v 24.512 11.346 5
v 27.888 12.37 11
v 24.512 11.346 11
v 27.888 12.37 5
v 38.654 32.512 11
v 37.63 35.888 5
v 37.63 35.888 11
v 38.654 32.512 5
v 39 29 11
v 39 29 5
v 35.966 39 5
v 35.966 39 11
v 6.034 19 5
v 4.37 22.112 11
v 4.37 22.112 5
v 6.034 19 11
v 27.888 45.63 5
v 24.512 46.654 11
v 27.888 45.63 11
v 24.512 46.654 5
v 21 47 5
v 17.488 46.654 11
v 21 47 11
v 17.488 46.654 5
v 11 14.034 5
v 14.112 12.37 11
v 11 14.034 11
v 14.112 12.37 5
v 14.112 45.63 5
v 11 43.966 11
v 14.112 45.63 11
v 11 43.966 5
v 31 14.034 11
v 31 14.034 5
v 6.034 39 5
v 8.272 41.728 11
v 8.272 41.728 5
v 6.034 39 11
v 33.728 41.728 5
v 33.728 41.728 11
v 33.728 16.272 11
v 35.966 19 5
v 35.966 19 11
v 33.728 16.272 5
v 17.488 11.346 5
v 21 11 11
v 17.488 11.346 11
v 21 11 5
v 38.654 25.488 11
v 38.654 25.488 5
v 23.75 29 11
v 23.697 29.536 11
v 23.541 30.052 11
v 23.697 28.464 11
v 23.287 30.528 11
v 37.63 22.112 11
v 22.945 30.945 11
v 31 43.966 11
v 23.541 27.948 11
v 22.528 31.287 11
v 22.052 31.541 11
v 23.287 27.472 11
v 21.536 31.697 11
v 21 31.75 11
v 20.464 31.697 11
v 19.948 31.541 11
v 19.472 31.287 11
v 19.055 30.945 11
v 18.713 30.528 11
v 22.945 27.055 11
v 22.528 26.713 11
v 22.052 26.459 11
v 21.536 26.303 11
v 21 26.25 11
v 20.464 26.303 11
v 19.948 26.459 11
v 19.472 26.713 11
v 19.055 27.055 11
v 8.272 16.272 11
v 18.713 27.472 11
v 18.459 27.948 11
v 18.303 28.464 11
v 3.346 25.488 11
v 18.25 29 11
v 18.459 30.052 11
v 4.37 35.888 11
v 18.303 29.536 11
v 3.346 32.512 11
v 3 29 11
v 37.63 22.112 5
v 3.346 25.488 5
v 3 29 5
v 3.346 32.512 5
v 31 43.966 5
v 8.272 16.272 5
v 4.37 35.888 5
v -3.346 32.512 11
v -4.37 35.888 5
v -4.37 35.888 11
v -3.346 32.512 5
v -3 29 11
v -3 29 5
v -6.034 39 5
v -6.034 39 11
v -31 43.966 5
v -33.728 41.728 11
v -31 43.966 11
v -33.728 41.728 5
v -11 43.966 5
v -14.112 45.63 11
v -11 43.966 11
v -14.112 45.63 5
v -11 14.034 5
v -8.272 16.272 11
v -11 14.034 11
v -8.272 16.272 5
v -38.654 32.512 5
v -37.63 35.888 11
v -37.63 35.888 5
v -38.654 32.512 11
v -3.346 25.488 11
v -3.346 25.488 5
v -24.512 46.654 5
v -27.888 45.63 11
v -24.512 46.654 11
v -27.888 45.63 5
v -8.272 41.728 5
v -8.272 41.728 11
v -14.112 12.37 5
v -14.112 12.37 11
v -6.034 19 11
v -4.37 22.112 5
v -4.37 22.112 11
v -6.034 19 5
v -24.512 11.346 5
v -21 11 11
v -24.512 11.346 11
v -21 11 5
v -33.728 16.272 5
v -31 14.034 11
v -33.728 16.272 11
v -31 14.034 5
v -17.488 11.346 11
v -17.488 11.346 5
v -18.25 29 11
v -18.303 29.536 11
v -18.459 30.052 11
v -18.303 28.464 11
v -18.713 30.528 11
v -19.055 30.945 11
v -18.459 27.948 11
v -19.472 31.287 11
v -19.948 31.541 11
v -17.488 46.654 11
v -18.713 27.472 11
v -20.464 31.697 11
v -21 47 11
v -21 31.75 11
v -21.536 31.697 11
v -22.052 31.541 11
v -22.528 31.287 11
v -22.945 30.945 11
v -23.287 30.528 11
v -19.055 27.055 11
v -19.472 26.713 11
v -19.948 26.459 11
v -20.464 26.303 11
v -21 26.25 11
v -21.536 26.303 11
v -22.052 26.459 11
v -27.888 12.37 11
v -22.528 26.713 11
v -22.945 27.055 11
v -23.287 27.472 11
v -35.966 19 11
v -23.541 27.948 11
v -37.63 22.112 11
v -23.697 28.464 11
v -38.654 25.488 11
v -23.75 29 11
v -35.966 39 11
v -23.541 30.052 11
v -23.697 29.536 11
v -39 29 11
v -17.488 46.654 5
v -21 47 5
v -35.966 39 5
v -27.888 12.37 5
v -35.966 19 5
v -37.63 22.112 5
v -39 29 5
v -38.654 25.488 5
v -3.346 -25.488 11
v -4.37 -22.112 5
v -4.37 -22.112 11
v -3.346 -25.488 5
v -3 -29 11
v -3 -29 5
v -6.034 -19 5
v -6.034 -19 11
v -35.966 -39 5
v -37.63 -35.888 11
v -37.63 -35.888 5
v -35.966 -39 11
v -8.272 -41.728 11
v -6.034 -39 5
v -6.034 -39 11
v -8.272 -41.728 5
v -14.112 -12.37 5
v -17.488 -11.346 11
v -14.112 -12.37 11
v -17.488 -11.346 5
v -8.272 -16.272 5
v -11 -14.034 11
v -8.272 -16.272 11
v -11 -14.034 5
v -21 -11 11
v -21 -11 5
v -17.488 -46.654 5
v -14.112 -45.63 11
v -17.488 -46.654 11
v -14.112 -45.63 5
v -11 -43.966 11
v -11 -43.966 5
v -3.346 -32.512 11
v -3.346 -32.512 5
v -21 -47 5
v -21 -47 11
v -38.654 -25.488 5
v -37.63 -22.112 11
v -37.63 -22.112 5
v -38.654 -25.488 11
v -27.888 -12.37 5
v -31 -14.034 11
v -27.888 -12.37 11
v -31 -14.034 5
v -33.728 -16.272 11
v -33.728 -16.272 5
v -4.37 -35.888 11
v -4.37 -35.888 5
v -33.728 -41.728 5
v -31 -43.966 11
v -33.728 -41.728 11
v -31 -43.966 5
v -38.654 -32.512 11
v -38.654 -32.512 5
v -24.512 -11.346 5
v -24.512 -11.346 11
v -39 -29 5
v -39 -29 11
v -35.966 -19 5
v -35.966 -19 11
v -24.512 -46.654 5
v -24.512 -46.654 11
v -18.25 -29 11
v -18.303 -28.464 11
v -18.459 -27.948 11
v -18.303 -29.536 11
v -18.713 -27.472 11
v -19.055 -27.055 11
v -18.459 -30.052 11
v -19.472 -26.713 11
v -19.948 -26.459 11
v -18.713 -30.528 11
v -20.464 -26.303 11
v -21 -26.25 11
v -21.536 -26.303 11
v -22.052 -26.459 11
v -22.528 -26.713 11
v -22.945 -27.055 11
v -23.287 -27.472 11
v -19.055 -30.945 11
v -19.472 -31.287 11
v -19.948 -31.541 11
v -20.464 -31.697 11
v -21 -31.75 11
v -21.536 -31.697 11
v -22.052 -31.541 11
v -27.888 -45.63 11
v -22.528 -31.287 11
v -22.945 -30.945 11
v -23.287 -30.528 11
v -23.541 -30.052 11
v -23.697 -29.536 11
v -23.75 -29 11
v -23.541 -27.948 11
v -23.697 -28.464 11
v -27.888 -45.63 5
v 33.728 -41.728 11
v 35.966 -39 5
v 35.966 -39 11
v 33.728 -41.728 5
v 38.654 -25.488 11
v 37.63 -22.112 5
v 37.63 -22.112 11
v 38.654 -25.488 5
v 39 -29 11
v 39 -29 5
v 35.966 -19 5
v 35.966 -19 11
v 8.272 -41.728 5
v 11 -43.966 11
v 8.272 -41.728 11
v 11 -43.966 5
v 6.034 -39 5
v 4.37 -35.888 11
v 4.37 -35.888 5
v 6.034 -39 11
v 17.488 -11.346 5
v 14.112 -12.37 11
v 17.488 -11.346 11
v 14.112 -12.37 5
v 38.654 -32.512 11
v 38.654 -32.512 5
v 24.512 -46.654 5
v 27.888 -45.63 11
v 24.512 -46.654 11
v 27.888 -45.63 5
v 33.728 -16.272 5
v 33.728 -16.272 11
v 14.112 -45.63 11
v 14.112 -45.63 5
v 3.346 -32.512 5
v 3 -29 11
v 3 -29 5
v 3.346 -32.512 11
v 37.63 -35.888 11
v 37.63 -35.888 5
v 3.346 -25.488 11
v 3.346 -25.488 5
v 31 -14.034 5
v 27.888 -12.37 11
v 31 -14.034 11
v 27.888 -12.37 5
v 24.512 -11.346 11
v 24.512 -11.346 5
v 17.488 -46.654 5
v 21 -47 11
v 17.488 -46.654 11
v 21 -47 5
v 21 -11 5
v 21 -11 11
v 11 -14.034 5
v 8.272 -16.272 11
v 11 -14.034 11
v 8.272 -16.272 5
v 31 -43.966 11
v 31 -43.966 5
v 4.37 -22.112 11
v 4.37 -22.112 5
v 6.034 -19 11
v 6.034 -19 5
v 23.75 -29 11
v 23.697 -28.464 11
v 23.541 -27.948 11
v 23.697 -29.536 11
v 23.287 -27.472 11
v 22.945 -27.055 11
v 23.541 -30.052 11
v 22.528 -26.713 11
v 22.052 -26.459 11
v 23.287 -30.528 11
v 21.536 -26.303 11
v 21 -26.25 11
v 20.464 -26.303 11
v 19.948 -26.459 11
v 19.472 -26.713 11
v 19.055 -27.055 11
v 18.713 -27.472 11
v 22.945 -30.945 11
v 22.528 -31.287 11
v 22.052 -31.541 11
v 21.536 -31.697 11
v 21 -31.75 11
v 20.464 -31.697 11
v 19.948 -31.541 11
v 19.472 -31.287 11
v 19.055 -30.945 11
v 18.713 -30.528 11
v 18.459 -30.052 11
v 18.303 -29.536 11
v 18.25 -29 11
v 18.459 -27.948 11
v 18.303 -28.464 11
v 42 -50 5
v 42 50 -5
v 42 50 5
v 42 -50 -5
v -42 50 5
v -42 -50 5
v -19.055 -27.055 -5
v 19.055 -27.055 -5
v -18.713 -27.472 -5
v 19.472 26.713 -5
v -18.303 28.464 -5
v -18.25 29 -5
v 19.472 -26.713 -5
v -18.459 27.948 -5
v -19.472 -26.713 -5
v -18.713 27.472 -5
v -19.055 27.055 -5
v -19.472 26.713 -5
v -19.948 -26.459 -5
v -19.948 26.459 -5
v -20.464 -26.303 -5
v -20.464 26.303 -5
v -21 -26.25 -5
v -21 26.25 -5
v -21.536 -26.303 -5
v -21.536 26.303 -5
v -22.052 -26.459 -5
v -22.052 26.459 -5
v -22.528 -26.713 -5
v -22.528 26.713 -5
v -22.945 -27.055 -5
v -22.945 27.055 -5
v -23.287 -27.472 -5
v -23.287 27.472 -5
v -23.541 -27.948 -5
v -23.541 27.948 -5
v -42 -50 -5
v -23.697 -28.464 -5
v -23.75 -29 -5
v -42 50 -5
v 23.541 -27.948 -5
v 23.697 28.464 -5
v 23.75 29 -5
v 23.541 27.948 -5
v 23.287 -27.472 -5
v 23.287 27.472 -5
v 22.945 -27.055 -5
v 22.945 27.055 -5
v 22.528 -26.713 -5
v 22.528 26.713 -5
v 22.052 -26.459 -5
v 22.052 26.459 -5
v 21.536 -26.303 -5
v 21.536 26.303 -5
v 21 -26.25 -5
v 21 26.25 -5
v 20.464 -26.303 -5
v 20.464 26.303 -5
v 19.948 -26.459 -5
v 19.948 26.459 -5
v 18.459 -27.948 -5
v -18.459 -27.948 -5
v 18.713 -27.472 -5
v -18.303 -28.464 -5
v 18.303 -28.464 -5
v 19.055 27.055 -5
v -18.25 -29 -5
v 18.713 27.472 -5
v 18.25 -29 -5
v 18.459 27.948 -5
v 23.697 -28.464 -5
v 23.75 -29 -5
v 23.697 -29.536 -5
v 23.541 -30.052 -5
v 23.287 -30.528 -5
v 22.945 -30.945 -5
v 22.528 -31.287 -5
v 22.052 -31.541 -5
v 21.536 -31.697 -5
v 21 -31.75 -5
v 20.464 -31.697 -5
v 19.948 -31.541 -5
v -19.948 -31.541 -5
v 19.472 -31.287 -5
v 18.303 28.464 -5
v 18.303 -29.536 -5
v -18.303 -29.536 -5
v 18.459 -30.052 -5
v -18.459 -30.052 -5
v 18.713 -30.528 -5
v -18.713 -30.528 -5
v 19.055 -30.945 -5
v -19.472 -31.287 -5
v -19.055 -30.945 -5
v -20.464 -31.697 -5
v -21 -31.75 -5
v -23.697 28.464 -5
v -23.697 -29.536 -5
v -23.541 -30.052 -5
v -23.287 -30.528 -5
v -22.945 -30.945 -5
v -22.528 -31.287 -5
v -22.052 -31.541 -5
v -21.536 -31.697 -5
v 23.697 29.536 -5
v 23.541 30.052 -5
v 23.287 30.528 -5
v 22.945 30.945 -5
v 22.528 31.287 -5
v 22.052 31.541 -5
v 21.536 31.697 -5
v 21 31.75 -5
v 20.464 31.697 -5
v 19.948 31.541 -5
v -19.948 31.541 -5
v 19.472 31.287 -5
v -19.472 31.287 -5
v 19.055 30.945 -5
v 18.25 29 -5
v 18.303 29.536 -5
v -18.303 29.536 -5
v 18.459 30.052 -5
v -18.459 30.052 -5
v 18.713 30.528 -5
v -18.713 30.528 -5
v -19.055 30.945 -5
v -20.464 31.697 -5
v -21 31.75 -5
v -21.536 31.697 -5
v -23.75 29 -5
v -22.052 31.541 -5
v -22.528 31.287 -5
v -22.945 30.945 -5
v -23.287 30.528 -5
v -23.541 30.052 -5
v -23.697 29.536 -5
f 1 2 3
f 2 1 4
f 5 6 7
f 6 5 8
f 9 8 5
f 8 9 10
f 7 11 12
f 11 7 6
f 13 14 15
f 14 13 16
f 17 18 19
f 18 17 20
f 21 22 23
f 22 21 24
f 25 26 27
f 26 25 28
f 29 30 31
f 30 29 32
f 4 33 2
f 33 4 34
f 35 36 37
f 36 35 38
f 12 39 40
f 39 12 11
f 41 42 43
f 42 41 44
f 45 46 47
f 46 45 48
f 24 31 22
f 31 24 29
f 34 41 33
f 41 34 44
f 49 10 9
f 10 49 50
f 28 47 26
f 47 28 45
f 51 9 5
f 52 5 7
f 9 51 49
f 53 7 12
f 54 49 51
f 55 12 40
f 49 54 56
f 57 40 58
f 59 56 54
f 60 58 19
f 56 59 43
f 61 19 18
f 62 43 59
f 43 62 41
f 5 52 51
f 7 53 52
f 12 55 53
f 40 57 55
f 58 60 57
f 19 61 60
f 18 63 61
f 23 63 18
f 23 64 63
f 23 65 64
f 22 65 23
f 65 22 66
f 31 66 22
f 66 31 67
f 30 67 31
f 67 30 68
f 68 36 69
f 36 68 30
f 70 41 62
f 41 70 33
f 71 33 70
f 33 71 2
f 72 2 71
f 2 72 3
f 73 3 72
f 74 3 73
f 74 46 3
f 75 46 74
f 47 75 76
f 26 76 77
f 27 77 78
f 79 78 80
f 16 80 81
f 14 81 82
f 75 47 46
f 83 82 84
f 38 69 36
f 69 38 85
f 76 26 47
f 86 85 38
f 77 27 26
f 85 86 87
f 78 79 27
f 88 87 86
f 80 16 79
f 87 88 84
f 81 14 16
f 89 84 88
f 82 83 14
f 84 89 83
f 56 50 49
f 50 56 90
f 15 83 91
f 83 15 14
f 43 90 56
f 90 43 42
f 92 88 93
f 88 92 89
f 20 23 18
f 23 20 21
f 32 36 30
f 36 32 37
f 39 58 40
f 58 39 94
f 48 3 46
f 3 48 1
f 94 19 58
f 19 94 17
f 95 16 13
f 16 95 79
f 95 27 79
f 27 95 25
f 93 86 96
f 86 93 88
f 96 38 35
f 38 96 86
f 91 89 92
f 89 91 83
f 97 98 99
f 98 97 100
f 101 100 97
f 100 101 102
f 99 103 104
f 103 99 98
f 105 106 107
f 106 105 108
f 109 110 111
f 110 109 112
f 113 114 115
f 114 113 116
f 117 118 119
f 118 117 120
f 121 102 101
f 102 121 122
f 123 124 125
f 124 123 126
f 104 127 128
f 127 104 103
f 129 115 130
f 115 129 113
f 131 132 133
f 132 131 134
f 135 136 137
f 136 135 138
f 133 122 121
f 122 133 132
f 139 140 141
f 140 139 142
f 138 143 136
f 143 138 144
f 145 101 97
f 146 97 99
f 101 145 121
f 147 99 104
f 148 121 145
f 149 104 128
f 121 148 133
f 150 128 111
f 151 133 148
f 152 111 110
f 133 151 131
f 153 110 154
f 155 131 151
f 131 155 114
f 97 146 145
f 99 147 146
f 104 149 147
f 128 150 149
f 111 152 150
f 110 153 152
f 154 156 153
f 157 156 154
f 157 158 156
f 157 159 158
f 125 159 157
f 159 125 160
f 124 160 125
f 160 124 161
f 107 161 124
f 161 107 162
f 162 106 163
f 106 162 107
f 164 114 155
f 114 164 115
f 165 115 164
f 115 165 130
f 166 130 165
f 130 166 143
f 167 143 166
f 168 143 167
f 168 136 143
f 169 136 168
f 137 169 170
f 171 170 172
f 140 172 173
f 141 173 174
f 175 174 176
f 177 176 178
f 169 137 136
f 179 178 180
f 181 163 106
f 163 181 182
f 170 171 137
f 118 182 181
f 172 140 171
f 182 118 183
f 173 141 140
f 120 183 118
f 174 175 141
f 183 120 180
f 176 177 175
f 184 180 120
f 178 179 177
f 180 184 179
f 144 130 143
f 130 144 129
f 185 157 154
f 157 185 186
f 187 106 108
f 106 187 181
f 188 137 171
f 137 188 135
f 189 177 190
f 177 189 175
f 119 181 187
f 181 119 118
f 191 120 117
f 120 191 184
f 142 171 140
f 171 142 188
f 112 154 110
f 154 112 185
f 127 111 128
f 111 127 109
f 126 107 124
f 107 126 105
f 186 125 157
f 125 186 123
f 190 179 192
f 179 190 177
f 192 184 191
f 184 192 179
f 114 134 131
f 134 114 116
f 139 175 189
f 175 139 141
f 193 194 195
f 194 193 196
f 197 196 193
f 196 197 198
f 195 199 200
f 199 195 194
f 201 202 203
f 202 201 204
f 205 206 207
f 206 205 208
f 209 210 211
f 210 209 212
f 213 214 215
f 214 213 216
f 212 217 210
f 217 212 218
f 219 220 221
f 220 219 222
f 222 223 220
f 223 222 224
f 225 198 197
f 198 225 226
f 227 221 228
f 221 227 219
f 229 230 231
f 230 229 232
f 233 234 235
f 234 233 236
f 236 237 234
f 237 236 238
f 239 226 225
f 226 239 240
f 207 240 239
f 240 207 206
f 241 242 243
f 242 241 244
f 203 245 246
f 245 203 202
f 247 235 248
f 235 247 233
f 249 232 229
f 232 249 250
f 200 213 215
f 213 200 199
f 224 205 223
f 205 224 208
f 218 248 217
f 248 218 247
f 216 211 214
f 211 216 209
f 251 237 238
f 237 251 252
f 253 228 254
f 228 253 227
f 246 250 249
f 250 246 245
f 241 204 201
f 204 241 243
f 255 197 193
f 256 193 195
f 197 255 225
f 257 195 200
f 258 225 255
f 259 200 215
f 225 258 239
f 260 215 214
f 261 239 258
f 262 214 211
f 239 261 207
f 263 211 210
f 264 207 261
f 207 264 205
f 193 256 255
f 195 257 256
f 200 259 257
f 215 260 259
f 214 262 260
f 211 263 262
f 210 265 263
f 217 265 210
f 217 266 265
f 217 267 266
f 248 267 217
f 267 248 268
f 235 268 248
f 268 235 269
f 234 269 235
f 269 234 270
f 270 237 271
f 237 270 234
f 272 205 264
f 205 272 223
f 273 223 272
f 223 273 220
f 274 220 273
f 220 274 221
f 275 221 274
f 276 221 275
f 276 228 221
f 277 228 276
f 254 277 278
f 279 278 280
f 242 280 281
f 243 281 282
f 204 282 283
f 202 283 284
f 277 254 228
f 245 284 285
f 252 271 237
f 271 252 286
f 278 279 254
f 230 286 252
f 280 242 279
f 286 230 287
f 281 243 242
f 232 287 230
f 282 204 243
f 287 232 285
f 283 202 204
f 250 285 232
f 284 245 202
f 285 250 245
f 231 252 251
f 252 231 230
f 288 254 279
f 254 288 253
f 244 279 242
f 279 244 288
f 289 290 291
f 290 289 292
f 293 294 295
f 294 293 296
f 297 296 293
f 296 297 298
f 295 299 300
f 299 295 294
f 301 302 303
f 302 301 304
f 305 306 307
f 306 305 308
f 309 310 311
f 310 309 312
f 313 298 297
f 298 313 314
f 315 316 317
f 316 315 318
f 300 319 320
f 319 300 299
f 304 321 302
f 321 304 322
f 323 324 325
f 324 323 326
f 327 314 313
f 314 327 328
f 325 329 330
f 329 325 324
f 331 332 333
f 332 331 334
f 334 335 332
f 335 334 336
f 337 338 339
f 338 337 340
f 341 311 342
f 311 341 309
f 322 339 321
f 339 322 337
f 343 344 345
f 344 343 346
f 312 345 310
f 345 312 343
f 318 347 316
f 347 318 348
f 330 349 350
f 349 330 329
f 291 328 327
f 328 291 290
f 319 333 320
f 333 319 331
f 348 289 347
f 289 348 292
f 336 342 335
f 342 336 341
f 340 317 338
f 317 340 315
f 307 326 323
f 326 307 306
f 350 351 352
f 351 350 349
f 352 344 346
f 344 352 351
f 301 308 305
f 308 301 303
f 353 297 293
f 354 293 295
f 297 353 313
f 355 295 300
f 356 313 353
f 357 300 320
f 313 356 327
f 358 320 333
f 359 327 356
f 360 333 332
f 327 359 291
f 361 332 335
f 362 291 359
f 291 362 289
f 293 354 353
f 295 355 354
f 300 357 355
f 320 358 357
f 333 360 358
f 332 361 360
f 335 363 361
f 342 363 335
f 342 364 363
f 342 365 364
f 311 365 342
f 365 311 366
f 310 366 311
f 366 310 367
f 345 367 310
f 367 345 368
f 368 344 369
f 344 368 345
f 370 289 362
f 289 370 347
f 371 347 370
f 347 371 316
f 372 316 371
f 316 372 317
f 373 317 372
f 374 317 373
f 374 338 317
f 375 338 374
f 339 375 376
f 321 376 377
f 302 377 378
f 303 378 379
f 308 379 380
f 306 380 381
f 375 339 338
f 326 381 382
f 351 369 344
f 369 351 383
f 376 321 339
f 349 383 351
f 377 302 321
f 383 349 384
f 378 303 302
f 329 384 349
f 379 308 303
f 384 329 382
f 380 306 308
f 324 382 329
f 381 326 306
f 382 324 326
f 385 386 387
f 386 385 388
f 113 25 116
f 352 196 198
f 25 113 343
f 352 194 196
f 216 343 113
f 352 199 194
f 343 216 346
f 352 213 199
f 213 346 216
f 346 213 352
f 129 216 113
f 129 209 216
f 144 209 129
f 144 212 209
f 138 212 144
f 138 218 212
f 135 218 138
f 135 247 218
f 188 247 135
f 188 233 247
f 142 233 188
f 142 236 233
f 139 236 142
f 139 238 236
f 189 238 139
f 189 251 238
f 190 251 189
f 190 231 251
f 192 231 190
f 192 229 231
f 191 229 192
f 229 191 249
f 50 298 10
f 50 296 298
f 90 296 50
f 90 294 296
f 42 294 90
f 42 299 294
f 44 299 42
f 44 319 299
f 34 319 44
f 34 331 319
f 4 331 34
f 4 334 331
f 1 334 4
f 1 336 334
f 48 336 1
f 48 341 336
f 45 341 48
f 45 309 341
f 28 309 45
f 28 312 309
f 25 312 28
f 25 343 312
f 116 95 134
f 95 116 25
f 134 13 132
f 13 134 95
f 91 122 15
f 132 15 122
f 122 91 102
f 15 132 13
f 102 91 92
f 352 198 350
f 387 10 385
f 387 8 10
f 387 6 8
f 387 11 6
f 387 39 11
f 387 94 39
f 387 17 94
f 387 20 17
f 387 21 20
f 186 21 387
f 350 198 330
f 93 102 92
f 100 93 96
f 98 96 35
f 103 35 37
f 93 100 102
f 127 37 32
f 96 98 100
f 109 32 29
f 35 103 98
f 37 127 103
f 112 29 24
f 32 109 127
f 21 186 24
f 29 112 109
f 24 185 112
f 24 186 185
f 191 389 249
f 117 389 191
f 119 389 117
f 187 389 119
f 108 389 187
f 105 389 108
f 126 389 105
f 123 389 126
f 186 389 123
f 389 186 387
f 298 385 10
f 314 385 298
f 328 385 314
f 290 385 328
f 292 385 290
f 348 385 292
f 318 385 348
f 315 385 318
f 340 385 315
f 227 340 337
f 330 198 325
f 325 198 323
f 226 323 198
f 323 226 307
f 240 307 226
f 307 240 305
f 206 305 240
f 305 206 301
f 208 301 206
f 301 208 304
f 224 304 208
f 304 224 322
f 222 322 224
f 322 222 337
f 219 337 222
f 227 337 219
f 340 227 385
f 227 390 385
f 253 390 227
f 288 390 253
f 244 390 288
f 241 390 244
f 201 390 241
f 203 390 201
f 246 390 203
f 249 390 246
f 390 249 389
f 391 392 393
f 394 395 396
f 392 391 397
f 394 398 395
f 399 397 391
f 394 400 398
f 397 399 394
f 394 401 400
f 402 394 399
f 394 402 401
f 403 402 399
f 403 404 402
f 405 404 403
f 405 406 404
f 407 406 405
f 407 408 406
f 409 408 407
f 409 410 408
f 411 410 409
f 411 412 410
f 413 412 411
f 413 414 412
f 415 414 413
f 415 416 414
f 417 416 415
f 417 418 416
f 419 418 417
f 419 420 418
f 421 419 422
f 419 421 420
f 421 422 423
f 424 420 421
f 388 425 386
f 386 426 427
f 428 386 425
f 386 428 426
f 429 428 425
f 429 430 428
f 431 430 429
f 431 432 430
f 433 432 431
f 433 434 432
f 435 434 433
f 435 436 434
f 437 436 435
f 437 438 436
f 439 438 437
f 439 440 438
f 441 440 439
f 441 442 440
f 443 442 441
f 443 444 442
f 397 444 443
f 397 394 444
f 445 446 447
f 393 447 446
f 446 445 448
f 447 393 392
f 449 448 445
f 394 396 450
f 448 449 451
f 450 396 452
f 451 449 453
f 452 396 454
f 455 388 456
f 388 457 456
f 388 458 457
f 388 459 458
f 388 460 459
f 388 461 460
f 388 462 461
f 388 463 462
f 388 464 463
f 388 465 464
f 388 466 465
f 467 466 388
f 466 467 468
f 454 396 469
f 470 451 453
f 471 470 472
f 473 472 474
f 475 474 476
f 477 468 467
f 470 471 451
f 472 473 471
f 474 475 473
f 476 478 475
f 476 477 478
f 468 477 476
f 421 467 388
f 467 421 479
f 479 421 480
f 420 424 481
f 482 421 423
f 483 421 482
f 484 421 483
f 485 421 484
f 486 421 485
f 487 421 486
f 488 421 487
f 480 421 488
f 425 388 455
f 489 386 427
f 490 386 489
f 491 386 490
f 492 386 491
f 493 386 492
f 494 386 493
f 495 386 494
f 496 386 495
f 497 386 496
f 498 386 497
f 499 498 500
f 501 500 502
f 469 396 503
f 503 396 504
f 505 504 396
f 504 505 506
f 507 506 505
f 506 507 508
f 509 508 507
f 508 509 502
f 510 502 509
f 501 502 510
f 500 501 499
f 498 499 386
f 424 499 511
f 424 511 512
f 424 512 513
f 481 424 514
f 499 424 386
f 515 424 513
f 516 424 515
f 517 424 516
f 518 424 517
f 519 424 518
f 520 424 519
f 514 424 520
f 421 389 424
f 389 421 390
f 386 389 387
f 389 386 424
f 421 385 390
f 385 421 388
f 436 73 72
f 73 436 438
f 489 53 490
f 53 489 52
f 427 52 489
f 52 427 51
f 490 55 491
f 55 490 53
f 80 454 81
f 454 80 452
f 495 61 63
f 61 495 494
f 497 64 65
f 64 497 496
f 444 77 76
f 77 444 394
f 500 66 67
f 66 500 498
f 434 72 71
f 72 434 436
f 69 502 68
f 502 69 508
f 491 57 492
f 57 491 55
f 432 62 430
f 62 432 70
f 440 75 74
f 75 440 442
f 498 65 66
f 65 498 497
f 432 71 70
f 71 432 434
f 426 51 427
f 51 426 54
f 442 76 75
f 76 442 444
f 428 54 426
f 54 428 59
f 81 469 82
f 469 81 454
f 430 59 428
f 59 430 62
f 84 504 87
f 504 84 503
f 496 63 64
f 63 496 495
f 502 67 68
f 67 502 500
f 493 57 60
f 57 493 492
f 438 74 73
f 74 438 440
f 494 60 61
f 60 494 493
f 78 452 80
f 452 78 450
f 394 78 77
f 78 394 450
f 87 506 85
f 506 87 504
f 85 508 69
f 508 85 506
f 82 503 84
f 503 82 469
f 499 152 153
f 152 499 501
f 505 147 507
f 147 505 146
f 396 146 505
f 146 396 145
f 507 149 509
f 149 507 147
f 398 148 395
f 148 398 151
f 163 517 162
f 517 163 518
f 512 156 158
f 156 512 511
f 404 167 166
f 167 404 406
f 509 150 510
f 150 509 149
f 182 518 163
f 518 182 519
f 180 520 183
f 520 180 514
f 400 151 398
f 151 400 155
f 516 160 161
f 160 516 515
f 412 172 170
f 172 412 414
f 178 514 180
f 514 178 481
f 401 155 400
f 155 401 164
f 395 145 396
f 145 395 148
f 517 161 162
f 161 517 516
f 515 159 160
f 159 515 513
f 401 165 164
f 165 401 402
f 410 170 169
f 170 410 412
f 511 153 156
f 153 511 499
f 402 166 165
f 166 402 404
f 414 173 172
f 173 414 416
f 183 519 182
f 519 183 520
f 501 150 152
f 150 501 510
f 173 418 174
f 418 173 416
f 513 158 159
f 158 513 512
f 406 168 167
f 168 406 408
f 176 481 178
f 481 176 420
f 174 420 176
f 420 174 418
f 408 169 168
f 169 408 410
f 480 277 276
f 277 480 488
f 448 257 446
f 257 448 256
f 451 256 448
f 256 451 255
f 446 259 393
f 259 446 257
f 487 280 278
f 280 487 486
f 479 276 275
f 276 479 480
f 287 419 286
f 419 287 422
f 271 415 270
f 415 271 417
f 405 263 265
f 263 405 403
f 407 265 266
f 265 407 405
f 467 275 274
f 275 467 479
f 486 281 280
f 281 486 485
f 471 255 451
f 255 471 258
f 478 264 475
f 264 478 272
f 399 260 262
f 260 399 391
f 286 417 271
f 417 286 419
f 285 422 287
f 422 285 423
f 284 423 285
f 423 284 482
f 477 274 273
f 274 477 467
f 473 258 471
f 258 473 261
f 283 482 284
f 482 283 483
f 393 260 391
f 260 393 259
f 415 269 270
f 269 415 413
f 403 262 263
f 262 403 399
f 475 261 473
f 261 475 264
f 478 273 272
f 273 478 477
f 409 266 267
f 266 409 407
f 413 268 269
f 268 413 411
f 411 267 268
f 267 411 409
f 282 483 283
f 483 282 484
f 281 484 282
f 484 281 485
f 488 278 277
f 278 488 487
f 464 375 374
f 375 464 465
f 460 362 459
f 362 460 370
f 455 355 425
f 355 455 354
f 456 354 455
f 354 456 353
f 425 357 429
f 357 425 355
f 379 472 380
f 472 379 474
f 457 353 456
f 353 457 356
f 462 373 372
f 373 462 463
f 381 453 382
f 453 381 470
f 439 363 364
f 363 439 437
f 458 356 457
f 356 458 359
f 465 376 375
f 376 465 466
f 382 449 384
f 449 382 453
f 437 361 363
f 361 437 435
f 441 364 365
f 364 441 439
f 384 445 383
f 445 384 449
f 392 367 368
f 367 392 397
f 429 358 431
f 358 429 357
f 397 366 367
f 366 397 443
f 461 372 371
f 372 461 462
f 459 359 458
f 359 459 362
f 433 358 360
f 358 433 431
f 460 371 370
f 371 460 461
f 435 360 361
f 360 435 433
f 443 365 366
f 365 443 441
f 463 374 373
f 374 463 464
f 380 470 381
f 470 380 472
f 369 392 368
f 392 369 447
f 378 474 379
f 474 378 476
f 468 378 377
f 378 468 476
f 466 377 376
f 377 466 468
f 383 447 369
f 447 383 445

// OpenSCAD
$fn = 32;

// ----------------------------------------------------------------------
// Anchor pads 84 x 100 x 16
// four corner bosses with anchor holes
// ----------------------------------------------------------------------

// --- parameters (mm) ---
plate = [84, 100, 10];  // base plate size (x, y, z)
pads = 4;               // boss count, one per corner
edge = 21;              // boss centre offset from the plate edge
boss_d = 36;            // boss diameter
boss_h = 6;             // boss height above the base plate
hole_d = 5.5;           // hole diameter

// --- derived feature positions (mm) ---
height = plate[2] + boss_h;      // = 16   overall height of the part
corner_x = plate[0] / 2 - edge;  // = 21   boss centre X
corner_y = plate[1] / 2 - edge;  // = 29   boss centre Y
feature_centers = [
  [corner_x, corner_y],
  [-corner_x, corner_y],
  [-corner_x, -corner_y],
  [corner_x, -corner_y]
];   // boss centres, anchor holes are drilled there

// base plate, four bosses standing on it, anchor holes all the way through
difference() {
  union() {
    cube(plate, center = true);
    for (centre = feature_centers)
      translate([centre[0], centre[1], plate[2] / 2 - 1])
        cylinder(d = boss_d, h = boss_h + 1);
  }
  for (centre = feature_centers)
    translate([centre[0], centre[1], -height])
      cylinder(d = hole_d, h = 2 * height + 2);  // through boss and plate
}
